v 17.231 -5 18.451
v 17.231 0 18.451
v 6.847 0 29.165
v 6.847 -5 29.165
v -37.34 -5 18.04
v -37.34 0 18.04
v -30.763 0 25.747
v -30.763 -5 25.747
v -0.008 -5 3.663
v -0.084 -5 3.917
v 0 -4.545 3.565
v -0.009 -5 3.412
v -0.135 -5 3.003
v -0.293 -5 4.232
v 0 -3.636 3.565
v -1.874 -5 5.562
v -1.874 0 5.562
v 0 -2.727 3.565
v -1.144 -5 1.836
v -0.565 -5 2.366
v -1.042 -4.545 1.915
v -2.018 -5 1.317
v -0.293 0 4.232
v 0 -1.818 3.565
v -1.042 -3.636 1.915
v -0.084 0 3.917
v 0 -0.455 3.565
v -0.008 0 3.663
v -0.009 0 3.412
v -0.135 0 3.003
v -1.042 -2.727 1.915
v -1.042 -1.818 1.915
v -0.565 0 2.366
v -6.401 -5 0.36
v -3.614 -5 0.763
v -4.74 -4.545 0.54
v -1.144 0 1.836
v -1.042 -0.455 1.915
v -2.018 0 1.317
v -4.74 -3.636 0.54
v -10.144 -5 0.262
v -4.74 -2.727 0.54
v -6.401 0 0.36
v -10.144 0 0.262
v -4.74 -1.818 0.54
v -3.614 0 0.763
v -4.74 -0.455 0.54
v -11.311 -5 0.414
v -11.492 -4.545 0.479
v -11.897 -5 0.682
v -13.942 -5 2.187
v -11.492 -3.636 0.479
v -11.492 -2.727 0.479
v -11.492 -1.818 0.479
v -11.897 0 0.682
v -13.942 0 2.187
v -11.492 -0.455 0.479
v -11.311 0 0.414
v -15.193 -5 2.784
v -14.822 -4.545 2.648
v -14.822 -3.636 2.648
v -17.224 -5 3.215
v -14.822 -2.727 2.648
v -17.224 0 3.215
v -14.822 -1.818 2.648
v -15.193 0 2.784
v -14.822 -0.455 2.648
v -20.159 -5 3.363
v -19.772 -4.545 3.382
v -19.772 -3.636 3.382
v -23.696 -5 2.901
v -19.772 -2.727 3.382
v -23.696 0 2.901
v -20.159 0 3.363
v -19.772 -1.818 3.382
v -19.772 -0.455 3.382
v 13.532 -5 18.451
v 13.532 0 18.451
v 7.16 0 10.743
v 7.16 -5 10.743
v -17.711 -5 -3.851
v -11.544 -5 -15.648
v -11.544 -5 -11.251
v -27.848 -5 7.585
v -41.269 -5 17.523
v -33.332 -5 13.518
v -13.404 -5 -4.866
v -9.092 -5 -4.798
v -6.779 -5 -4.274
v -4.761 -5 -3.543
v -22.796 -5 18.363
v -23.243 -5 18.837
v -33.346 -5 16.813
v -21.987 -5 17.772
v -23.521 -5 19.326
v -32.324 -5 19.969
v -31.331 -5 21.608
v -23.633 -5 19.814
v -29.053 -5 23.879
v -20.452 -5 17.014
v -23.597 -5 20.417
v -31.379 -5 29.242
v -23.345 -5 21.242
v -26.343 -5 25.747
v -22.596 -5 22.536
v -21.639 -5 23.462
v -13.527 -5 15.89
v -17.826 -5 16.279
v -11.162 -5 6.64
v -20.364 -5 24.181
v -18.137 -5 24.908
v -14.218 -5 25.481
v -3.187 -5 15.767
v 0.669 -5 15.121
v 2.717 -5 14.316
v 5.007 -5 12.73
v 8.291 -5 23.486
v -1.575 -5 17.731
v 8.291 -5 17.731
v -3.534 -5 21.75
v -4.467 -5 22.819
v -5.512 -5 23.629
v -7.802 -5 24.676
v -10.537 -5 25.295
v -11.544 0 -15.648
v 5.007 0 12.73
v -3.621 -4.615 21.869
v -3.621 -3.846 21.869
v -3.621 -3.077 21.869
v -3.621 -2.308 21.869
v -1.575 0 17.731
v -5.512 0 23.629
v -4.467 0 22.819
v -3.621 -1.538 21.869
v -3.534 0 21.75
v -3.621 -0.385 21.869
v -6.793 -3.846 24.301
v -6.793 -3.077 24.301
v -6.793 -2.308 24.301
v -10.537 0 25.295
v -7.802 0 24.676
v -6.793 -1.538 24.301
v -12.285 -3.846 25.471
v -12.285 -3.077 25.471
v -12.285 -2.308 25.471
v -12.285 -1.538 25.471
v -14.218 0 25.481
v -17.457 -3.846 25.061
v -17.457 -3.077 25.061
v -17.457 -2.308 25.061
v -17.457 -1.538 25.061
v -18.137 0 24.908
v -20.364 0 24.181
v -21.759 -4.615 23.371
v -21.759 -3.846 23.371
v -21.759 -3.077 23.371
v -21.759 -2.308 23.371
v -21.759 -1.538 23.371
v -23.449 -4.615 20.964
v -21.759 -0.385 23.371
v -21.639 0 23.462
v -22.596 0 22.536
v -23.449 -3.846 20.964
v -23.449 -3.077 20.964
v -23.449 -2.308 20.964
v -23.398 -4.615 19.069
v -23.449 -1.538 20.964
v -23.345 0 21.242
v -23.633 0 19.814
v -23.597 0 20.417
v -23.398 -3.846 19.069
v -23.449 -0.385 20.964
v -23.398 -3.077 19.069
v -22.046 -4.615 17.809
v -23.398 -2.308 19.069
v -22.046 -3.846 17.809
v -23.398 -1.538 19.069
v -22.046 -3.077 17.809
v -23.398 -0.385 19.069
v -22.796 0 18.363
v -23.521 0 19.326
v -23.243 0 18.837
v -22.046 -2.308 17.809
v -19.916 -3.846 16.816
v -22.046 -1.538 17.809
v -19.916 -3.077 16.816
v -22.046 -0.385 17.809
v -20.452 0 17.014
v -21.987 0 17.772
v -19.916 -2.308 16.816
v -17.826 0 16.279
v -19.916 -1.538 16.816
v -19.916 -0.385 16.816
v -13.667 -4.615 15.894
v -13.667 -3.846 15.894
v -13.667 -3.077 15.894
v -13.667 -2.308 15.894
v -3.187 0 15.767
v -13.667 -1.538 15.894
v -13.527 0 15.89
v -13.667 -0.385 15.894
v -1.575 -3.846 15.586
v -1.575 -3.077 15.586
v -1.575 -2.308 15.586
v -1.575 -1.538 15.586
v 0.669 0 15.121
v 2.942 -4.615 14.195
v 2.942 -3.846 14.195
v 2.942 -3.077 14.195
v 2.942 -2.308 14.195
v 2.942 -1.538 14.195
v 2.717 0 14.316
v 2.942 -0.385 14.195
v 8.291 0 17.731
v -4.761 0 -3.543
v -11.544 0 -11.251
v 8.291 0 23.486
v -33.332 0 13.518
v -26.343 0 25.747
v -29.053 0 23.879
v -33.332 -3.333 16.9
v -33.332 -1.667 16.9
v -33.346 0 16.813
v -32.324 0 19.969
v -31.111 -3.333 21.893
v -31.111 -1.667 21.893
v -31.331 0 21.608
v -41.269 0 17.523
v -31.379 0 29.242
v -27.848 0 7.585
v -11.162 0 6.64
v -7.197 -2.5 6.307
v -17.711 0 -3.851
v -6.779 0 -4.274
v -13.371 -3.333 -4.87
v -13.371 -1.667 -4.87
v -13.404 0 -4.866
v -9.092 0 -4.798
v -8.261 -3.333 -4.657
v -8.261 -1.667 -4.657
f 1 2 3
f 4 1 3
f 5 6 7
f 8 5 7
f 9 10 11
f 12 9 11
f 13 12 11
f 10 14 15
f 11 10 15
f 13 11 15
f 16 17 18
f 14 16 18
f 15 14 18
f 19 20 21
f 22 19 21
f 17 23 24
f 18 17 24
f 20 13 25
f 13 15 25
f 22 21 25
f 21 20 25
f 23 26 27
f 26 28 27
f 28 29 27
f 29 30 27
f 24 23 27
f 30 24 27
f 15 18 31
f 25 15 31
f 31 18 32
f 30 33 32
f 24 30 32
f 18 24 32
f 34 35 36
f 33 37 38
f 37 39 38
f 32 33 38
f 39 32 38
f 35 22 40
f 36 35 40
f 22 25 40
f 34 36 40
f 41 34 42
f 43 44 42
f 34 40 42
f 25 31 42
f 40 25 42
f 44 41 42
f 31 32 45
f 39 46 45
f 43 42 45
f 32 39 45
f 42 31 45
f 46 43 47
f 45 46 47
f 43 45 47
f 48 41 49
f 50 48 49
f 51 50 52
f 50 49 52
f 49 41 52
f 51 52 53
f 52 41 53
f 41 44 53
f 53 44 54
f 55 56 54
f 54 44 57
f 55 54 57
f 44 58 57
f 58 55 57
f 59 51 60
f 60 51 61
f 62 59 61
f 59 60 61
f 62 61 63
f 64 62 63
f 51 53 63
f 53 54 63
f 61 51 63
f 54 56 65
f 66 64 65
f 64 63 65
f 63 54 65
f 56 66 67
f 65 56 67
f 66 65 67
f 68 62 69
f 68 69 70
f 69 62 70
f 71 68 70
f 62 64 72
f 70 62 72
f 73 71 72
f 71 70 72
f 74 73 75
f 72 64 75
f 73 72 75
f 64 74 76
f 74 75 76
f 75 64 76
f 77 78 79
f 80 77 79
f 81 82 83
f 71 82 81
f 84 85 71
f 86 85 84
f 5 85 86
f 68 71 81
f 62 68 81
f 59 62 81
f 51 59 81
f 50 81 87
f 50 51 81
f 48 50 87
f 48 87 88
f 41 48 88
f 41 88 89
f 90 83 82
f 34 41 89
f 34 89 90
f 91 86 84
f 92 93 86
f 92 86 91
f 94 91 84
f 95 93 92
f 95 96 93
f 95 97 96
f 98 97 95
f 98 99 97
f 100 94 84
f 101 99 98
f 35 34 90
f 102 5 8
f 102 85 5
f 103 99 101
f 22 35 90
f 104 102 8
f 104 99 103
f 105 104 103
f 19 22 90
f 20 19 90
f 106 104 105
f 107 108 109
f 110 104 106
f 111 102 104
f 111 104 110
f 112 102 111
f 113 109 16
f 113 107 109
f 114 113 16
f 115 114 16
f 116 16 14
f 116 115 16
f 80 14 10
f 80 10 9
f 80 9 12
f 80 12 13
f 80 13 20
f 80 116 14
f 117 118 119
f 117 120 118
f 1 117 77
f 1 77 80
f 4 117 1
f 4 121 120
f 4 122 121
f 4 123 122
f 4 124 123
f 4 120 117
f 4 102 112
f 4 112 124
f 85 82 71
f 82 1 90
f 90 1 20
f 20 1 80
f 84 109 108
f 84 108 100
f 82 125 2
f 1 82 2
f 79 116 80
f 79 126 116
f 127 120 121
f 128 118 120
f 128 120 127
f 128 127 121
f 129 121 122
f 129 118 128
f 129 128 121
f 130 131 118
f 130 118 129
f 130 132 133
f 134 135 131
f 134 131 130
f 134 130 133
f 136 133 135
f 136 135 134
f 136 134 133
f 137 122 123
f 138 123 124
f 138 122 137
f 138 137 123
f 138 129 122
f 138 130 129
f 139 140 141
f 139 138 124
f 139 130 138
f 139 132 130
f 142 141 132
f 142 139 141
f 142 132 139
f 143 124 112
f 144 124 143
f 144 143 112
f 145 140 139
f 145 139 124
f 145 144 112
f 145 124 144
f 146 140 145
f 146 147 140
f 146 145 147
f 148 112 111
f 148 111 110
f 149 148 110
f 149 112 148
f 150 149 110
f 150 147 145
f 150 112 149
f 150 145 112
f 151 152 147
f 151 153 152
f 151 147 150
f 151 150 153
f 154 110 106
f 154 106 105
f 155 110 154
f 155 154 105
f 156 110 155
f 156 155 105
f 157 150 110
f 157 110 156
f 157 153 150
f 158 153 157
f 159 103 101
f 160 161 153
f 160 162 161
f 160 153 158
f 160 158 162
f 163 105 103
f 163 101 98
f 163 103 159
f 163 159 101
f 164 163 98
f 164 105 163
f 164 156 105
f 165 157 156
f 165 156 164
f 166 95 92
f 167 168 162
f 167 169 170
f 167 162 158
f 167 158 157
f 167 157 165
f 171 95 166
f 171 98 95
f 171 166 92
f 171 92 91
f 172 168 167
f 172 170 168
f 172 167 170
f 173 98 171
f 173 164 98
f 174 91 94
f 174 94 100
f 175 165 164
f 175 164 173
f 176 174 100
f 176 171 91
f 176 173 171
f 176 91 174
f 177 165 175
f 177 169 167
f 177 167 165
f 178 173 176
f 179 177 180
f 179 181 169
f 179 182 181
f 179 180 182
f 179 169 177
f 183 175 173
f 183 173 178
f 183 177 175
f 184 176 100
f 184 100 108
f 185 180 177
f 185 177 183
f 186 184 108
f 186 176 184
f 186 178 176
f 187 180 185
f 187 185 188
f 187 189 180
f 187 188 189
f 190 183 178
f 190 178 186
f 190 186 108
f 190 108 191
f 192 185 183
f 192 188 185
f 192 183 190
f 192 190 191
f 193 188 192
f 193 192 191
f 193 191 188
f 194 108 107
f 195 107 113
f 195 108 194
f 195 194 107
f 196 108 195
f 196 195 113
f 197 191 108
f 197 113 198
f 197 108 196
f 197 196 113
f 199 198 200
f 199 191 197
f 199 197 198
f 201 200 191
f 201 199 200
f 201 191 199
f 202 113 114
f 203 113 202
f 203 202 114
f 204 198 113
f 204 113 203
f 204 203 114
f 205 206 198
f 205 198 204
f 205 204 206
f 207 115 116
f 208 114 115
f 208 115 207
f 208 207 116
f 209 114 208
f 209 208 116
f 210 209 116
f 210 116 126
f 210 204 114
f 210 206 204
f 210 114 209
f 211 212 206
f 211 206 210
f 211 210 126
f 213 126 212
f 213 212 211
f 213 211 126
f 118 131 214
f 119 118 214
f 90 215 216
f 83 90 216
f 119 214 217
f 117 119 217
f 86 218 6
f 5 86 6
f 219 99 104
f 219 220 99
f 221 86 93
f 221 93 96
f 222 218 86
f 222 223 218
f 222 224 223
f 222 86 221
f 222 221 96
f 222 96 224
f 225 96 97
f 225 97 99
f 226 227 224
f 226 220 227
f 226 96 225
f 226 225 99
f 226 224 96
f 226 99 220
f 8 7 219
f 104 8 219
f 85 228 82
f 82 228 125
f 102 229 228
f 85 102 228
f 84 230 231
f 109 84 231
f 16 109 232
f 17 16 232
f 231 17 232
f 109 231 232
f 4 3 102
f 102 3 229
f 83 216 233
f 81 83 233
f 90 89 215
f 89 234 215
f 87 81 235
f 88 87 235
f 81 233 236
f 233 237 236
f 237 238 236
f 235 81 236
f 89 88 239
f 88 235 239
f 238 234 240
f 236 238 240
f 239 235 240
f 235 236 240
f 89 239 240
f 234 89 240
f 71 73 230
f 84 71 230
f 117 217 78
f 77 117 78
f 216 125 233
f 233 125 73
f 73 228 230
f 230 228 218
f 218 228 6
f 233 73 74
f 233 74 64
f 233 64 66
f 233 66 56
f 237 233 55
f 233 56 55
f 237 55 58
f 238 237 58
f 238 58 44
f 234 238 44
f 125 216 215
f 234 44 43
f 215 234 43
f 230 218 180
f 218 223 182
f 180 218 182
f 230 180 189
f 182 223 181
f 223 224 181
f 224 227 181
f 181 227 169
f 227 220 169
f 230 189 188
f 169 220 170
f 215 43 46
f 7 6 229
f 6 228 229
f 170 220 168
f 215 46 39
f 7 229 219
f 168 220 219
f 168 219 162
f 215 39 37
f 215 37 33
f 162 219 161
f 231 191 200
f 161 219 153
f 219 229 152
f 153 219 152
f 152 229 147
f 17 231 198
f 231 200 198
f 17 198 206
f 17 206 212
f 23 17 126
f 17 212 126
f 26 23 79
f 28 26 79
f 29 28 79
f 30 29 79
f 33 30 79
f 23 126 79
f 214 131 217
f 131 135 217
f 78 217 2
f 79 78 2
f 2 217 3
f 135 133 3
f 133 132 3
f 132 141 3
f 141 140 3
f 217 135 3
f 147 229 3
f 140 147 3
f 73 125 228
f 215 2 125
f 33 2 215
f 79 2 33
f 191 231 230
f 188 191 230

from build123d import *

# Parameters (mm, degrees)
F1_DEPTH = 5


with BuildPart() as f1:
    # F0 (on Front) → F1 (new body)
    with BuildSketch(Plane.XZ):
        Polygon((6.8467608653, 29.1649848223), (-31.379327178, 29.241707176), (-41.2686094642, 17.5228919834), (-11.5442769602, -15.64797014), (17.2308642175, 18.4506177902), align=None)
        with BuildLine():
            Line((-23.6961469054, 2.9009203427), (-27.847610414, 7.5846225955))
            add(Edge.make_bspline(
                [(-27.847610414, 7.5846225955), (-19.8370461585, 7.1792182284), (-7.743850984, 6.5671971549), (-3.3557602446, 5.8157885618), (-1.8743523397, 5.562114995)],
                knots=[0, 0, 0, 0, 0.6624026273, 1, 1, 1, 1], degree=3))
            add(Edge.make_bspline(
                [(-1.8743523397, 5.562114995), (-1.4179422708, 5.2205821712), (-0.585004998, 4.5972930761), (0.3331977784, 3.5560373112), (-1.010582746, 1.5006672697), (-4.7068912366, 0.3001401954), (-9.3254664772, 0.2750656567), (-11.5190753977, 0.2264516302), (-13.1447218731, 1.6614626896), (-14.7675912552, 2.7897659842), (-17.1739824037, 3.2404166307), (-19.8261847392, 3.523178168), (-22.3243012801, 3.1215017434), (-23.6961469054, 2.9009203427)],
                knots=[0, 0, 0, 0, 0.0742843887, 0.1355672023, 0.2162485732, 0.3309490429, 0.4559254615, 0.5393908146, 0.6210669212, 0.7022428758, 0.790900937, 0.8851728372, 1, 1, 1, 1], degree=3))
        make_face(mode=Mode.SUBTRACT)
        with BuildLine():
            Line((-11.5442769602, -11.2505741417), (-17.7106130868, -3.8509704173))
            add(Edge.make_bspline(
                [(-17.7106130868, -3.8509704173), (-16.3226608848, -4.2718337351), (-13.4481313377, -5.1434660871), (-8.2276905085, -4.8931100883), (-5.8513779321, -3.9673311063), (-4.7613061033, -3.5426539835)],
                knots=[0, 0, 0, 0, 0.3357095554, 0.695273969, 1, 1, 1, 1], degree=3))
            Line((-4.7613061033, -3.5426539835), (-11.5442769602, -11.2505741417))
        make_face(mode=Mode.SUBTRACT)
        with BuildLine():
            Line((-37.3401194811, 18.0395282805), (-30.7626947761, 25.7474500686))
            Line((-30.7626947761, 25.7474500686), (-26.3434872031, 25.7474500686))
            add(Edge.make_bspline(
                [(-33.3320014179, 13.5175473988), (-33.4352493357, 14.5816524239), (-33.6697363916, 16.998348661), (-31.4985236243, 22.4095155368), (-28.0944284632, 24.6136991466), (-26.3434872031, 25.7474500686)],
                knots=[0, 0, 0, 0, 0.2764414704, 0.6278281236, 1, 1, 1, 1], degree=3))
            Line((-33.3320014179, 13.5175473988), (-37.3401194811, 18.0395282805))
        make_face(mode=Mode.SUBTRACT)
        with BuildLine():
            Line((8.2907760516, 17.7312102169), (8.2907760516, 23.4864596277))
            Line((8.2907760516, 23.4864596277), (13.5321617126, 18.4506177902))
            Line((13.5321617126, 18.4506177902), (7.1602808312, 10.7426950708))
            add(Edge.make_bspline(
                [(-1.5753639163, 17.7312102169), (-2.1681666347, 19.2227640195), (-3.3125827283, 22.1022349186), (-6.6744835027, 24.6564570993), (-12.3505834457, 25.7354953948), (-17.3440689805, 25.2648643198), (-21.9570699991, 23.8168081138), (-23.5944944017, 21.0759037774), (-23.8438395799, 18.743270129), (-19.7163395181, 16.3201047984), (-13.6718770191, 15.7522211208), (-6.8063195481, 15.9645316546), (-1.6258813787, 15.7606132749), (3.1922483306, 14.5681097618), (5.8065686961, 12.0477524987), (7.1602808312, 10.7426950708)],
                knots=[0, 0, 0, 0, 0.0767260342, 0.1481209611, 0.2327425226, 0.3140883717, 0.3908631304, 0.4521063897, 0.5012736199, 0.5740049671, 0.6637506815, 0.7576500248, 0.8389855697, 0.9166256779, 1, 1, 1, 1], degree=3))
            Line((-1.5753639163, 17.7312102169), (8.2907760516, 17.7312102169))
        make_face(mode=Mode.SUBTRACT)
    extrude(amount=F1_DEPTH)


solid = f1.part
